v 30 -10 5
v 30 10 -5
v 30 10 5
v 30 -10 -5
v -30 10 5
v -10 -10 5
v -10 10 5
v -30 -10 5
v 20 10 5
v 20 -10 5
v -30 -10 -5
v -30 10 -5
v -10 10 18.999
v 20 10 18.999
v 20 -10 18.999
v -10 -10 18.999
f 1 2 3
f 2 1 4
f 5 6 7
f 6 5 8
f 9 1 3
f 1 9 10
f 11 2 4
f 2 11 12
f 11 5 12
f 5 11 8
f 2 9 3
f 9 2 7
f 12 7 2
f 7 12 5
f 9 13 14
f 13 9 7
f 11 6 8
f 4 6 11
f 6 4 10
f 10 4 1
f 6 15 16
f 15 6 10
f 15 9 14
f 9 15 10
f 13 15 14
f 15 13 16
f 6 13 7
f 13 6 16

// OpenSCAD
//$fa = 1;
//$fs = 0.4;

module body(base_height=10, top_height=14, base_length=60, top_length=30, width=20, top_offset=5) {
    // car body base
    cube(size=[base_length, width, base_height], center=true);
    // car body top
    translate([top_offset, 0, base_height/2+top_height/2 - 0.001]) {
        cube(size=[top_length, width, top_height], center=true);    
    }
}

body();
